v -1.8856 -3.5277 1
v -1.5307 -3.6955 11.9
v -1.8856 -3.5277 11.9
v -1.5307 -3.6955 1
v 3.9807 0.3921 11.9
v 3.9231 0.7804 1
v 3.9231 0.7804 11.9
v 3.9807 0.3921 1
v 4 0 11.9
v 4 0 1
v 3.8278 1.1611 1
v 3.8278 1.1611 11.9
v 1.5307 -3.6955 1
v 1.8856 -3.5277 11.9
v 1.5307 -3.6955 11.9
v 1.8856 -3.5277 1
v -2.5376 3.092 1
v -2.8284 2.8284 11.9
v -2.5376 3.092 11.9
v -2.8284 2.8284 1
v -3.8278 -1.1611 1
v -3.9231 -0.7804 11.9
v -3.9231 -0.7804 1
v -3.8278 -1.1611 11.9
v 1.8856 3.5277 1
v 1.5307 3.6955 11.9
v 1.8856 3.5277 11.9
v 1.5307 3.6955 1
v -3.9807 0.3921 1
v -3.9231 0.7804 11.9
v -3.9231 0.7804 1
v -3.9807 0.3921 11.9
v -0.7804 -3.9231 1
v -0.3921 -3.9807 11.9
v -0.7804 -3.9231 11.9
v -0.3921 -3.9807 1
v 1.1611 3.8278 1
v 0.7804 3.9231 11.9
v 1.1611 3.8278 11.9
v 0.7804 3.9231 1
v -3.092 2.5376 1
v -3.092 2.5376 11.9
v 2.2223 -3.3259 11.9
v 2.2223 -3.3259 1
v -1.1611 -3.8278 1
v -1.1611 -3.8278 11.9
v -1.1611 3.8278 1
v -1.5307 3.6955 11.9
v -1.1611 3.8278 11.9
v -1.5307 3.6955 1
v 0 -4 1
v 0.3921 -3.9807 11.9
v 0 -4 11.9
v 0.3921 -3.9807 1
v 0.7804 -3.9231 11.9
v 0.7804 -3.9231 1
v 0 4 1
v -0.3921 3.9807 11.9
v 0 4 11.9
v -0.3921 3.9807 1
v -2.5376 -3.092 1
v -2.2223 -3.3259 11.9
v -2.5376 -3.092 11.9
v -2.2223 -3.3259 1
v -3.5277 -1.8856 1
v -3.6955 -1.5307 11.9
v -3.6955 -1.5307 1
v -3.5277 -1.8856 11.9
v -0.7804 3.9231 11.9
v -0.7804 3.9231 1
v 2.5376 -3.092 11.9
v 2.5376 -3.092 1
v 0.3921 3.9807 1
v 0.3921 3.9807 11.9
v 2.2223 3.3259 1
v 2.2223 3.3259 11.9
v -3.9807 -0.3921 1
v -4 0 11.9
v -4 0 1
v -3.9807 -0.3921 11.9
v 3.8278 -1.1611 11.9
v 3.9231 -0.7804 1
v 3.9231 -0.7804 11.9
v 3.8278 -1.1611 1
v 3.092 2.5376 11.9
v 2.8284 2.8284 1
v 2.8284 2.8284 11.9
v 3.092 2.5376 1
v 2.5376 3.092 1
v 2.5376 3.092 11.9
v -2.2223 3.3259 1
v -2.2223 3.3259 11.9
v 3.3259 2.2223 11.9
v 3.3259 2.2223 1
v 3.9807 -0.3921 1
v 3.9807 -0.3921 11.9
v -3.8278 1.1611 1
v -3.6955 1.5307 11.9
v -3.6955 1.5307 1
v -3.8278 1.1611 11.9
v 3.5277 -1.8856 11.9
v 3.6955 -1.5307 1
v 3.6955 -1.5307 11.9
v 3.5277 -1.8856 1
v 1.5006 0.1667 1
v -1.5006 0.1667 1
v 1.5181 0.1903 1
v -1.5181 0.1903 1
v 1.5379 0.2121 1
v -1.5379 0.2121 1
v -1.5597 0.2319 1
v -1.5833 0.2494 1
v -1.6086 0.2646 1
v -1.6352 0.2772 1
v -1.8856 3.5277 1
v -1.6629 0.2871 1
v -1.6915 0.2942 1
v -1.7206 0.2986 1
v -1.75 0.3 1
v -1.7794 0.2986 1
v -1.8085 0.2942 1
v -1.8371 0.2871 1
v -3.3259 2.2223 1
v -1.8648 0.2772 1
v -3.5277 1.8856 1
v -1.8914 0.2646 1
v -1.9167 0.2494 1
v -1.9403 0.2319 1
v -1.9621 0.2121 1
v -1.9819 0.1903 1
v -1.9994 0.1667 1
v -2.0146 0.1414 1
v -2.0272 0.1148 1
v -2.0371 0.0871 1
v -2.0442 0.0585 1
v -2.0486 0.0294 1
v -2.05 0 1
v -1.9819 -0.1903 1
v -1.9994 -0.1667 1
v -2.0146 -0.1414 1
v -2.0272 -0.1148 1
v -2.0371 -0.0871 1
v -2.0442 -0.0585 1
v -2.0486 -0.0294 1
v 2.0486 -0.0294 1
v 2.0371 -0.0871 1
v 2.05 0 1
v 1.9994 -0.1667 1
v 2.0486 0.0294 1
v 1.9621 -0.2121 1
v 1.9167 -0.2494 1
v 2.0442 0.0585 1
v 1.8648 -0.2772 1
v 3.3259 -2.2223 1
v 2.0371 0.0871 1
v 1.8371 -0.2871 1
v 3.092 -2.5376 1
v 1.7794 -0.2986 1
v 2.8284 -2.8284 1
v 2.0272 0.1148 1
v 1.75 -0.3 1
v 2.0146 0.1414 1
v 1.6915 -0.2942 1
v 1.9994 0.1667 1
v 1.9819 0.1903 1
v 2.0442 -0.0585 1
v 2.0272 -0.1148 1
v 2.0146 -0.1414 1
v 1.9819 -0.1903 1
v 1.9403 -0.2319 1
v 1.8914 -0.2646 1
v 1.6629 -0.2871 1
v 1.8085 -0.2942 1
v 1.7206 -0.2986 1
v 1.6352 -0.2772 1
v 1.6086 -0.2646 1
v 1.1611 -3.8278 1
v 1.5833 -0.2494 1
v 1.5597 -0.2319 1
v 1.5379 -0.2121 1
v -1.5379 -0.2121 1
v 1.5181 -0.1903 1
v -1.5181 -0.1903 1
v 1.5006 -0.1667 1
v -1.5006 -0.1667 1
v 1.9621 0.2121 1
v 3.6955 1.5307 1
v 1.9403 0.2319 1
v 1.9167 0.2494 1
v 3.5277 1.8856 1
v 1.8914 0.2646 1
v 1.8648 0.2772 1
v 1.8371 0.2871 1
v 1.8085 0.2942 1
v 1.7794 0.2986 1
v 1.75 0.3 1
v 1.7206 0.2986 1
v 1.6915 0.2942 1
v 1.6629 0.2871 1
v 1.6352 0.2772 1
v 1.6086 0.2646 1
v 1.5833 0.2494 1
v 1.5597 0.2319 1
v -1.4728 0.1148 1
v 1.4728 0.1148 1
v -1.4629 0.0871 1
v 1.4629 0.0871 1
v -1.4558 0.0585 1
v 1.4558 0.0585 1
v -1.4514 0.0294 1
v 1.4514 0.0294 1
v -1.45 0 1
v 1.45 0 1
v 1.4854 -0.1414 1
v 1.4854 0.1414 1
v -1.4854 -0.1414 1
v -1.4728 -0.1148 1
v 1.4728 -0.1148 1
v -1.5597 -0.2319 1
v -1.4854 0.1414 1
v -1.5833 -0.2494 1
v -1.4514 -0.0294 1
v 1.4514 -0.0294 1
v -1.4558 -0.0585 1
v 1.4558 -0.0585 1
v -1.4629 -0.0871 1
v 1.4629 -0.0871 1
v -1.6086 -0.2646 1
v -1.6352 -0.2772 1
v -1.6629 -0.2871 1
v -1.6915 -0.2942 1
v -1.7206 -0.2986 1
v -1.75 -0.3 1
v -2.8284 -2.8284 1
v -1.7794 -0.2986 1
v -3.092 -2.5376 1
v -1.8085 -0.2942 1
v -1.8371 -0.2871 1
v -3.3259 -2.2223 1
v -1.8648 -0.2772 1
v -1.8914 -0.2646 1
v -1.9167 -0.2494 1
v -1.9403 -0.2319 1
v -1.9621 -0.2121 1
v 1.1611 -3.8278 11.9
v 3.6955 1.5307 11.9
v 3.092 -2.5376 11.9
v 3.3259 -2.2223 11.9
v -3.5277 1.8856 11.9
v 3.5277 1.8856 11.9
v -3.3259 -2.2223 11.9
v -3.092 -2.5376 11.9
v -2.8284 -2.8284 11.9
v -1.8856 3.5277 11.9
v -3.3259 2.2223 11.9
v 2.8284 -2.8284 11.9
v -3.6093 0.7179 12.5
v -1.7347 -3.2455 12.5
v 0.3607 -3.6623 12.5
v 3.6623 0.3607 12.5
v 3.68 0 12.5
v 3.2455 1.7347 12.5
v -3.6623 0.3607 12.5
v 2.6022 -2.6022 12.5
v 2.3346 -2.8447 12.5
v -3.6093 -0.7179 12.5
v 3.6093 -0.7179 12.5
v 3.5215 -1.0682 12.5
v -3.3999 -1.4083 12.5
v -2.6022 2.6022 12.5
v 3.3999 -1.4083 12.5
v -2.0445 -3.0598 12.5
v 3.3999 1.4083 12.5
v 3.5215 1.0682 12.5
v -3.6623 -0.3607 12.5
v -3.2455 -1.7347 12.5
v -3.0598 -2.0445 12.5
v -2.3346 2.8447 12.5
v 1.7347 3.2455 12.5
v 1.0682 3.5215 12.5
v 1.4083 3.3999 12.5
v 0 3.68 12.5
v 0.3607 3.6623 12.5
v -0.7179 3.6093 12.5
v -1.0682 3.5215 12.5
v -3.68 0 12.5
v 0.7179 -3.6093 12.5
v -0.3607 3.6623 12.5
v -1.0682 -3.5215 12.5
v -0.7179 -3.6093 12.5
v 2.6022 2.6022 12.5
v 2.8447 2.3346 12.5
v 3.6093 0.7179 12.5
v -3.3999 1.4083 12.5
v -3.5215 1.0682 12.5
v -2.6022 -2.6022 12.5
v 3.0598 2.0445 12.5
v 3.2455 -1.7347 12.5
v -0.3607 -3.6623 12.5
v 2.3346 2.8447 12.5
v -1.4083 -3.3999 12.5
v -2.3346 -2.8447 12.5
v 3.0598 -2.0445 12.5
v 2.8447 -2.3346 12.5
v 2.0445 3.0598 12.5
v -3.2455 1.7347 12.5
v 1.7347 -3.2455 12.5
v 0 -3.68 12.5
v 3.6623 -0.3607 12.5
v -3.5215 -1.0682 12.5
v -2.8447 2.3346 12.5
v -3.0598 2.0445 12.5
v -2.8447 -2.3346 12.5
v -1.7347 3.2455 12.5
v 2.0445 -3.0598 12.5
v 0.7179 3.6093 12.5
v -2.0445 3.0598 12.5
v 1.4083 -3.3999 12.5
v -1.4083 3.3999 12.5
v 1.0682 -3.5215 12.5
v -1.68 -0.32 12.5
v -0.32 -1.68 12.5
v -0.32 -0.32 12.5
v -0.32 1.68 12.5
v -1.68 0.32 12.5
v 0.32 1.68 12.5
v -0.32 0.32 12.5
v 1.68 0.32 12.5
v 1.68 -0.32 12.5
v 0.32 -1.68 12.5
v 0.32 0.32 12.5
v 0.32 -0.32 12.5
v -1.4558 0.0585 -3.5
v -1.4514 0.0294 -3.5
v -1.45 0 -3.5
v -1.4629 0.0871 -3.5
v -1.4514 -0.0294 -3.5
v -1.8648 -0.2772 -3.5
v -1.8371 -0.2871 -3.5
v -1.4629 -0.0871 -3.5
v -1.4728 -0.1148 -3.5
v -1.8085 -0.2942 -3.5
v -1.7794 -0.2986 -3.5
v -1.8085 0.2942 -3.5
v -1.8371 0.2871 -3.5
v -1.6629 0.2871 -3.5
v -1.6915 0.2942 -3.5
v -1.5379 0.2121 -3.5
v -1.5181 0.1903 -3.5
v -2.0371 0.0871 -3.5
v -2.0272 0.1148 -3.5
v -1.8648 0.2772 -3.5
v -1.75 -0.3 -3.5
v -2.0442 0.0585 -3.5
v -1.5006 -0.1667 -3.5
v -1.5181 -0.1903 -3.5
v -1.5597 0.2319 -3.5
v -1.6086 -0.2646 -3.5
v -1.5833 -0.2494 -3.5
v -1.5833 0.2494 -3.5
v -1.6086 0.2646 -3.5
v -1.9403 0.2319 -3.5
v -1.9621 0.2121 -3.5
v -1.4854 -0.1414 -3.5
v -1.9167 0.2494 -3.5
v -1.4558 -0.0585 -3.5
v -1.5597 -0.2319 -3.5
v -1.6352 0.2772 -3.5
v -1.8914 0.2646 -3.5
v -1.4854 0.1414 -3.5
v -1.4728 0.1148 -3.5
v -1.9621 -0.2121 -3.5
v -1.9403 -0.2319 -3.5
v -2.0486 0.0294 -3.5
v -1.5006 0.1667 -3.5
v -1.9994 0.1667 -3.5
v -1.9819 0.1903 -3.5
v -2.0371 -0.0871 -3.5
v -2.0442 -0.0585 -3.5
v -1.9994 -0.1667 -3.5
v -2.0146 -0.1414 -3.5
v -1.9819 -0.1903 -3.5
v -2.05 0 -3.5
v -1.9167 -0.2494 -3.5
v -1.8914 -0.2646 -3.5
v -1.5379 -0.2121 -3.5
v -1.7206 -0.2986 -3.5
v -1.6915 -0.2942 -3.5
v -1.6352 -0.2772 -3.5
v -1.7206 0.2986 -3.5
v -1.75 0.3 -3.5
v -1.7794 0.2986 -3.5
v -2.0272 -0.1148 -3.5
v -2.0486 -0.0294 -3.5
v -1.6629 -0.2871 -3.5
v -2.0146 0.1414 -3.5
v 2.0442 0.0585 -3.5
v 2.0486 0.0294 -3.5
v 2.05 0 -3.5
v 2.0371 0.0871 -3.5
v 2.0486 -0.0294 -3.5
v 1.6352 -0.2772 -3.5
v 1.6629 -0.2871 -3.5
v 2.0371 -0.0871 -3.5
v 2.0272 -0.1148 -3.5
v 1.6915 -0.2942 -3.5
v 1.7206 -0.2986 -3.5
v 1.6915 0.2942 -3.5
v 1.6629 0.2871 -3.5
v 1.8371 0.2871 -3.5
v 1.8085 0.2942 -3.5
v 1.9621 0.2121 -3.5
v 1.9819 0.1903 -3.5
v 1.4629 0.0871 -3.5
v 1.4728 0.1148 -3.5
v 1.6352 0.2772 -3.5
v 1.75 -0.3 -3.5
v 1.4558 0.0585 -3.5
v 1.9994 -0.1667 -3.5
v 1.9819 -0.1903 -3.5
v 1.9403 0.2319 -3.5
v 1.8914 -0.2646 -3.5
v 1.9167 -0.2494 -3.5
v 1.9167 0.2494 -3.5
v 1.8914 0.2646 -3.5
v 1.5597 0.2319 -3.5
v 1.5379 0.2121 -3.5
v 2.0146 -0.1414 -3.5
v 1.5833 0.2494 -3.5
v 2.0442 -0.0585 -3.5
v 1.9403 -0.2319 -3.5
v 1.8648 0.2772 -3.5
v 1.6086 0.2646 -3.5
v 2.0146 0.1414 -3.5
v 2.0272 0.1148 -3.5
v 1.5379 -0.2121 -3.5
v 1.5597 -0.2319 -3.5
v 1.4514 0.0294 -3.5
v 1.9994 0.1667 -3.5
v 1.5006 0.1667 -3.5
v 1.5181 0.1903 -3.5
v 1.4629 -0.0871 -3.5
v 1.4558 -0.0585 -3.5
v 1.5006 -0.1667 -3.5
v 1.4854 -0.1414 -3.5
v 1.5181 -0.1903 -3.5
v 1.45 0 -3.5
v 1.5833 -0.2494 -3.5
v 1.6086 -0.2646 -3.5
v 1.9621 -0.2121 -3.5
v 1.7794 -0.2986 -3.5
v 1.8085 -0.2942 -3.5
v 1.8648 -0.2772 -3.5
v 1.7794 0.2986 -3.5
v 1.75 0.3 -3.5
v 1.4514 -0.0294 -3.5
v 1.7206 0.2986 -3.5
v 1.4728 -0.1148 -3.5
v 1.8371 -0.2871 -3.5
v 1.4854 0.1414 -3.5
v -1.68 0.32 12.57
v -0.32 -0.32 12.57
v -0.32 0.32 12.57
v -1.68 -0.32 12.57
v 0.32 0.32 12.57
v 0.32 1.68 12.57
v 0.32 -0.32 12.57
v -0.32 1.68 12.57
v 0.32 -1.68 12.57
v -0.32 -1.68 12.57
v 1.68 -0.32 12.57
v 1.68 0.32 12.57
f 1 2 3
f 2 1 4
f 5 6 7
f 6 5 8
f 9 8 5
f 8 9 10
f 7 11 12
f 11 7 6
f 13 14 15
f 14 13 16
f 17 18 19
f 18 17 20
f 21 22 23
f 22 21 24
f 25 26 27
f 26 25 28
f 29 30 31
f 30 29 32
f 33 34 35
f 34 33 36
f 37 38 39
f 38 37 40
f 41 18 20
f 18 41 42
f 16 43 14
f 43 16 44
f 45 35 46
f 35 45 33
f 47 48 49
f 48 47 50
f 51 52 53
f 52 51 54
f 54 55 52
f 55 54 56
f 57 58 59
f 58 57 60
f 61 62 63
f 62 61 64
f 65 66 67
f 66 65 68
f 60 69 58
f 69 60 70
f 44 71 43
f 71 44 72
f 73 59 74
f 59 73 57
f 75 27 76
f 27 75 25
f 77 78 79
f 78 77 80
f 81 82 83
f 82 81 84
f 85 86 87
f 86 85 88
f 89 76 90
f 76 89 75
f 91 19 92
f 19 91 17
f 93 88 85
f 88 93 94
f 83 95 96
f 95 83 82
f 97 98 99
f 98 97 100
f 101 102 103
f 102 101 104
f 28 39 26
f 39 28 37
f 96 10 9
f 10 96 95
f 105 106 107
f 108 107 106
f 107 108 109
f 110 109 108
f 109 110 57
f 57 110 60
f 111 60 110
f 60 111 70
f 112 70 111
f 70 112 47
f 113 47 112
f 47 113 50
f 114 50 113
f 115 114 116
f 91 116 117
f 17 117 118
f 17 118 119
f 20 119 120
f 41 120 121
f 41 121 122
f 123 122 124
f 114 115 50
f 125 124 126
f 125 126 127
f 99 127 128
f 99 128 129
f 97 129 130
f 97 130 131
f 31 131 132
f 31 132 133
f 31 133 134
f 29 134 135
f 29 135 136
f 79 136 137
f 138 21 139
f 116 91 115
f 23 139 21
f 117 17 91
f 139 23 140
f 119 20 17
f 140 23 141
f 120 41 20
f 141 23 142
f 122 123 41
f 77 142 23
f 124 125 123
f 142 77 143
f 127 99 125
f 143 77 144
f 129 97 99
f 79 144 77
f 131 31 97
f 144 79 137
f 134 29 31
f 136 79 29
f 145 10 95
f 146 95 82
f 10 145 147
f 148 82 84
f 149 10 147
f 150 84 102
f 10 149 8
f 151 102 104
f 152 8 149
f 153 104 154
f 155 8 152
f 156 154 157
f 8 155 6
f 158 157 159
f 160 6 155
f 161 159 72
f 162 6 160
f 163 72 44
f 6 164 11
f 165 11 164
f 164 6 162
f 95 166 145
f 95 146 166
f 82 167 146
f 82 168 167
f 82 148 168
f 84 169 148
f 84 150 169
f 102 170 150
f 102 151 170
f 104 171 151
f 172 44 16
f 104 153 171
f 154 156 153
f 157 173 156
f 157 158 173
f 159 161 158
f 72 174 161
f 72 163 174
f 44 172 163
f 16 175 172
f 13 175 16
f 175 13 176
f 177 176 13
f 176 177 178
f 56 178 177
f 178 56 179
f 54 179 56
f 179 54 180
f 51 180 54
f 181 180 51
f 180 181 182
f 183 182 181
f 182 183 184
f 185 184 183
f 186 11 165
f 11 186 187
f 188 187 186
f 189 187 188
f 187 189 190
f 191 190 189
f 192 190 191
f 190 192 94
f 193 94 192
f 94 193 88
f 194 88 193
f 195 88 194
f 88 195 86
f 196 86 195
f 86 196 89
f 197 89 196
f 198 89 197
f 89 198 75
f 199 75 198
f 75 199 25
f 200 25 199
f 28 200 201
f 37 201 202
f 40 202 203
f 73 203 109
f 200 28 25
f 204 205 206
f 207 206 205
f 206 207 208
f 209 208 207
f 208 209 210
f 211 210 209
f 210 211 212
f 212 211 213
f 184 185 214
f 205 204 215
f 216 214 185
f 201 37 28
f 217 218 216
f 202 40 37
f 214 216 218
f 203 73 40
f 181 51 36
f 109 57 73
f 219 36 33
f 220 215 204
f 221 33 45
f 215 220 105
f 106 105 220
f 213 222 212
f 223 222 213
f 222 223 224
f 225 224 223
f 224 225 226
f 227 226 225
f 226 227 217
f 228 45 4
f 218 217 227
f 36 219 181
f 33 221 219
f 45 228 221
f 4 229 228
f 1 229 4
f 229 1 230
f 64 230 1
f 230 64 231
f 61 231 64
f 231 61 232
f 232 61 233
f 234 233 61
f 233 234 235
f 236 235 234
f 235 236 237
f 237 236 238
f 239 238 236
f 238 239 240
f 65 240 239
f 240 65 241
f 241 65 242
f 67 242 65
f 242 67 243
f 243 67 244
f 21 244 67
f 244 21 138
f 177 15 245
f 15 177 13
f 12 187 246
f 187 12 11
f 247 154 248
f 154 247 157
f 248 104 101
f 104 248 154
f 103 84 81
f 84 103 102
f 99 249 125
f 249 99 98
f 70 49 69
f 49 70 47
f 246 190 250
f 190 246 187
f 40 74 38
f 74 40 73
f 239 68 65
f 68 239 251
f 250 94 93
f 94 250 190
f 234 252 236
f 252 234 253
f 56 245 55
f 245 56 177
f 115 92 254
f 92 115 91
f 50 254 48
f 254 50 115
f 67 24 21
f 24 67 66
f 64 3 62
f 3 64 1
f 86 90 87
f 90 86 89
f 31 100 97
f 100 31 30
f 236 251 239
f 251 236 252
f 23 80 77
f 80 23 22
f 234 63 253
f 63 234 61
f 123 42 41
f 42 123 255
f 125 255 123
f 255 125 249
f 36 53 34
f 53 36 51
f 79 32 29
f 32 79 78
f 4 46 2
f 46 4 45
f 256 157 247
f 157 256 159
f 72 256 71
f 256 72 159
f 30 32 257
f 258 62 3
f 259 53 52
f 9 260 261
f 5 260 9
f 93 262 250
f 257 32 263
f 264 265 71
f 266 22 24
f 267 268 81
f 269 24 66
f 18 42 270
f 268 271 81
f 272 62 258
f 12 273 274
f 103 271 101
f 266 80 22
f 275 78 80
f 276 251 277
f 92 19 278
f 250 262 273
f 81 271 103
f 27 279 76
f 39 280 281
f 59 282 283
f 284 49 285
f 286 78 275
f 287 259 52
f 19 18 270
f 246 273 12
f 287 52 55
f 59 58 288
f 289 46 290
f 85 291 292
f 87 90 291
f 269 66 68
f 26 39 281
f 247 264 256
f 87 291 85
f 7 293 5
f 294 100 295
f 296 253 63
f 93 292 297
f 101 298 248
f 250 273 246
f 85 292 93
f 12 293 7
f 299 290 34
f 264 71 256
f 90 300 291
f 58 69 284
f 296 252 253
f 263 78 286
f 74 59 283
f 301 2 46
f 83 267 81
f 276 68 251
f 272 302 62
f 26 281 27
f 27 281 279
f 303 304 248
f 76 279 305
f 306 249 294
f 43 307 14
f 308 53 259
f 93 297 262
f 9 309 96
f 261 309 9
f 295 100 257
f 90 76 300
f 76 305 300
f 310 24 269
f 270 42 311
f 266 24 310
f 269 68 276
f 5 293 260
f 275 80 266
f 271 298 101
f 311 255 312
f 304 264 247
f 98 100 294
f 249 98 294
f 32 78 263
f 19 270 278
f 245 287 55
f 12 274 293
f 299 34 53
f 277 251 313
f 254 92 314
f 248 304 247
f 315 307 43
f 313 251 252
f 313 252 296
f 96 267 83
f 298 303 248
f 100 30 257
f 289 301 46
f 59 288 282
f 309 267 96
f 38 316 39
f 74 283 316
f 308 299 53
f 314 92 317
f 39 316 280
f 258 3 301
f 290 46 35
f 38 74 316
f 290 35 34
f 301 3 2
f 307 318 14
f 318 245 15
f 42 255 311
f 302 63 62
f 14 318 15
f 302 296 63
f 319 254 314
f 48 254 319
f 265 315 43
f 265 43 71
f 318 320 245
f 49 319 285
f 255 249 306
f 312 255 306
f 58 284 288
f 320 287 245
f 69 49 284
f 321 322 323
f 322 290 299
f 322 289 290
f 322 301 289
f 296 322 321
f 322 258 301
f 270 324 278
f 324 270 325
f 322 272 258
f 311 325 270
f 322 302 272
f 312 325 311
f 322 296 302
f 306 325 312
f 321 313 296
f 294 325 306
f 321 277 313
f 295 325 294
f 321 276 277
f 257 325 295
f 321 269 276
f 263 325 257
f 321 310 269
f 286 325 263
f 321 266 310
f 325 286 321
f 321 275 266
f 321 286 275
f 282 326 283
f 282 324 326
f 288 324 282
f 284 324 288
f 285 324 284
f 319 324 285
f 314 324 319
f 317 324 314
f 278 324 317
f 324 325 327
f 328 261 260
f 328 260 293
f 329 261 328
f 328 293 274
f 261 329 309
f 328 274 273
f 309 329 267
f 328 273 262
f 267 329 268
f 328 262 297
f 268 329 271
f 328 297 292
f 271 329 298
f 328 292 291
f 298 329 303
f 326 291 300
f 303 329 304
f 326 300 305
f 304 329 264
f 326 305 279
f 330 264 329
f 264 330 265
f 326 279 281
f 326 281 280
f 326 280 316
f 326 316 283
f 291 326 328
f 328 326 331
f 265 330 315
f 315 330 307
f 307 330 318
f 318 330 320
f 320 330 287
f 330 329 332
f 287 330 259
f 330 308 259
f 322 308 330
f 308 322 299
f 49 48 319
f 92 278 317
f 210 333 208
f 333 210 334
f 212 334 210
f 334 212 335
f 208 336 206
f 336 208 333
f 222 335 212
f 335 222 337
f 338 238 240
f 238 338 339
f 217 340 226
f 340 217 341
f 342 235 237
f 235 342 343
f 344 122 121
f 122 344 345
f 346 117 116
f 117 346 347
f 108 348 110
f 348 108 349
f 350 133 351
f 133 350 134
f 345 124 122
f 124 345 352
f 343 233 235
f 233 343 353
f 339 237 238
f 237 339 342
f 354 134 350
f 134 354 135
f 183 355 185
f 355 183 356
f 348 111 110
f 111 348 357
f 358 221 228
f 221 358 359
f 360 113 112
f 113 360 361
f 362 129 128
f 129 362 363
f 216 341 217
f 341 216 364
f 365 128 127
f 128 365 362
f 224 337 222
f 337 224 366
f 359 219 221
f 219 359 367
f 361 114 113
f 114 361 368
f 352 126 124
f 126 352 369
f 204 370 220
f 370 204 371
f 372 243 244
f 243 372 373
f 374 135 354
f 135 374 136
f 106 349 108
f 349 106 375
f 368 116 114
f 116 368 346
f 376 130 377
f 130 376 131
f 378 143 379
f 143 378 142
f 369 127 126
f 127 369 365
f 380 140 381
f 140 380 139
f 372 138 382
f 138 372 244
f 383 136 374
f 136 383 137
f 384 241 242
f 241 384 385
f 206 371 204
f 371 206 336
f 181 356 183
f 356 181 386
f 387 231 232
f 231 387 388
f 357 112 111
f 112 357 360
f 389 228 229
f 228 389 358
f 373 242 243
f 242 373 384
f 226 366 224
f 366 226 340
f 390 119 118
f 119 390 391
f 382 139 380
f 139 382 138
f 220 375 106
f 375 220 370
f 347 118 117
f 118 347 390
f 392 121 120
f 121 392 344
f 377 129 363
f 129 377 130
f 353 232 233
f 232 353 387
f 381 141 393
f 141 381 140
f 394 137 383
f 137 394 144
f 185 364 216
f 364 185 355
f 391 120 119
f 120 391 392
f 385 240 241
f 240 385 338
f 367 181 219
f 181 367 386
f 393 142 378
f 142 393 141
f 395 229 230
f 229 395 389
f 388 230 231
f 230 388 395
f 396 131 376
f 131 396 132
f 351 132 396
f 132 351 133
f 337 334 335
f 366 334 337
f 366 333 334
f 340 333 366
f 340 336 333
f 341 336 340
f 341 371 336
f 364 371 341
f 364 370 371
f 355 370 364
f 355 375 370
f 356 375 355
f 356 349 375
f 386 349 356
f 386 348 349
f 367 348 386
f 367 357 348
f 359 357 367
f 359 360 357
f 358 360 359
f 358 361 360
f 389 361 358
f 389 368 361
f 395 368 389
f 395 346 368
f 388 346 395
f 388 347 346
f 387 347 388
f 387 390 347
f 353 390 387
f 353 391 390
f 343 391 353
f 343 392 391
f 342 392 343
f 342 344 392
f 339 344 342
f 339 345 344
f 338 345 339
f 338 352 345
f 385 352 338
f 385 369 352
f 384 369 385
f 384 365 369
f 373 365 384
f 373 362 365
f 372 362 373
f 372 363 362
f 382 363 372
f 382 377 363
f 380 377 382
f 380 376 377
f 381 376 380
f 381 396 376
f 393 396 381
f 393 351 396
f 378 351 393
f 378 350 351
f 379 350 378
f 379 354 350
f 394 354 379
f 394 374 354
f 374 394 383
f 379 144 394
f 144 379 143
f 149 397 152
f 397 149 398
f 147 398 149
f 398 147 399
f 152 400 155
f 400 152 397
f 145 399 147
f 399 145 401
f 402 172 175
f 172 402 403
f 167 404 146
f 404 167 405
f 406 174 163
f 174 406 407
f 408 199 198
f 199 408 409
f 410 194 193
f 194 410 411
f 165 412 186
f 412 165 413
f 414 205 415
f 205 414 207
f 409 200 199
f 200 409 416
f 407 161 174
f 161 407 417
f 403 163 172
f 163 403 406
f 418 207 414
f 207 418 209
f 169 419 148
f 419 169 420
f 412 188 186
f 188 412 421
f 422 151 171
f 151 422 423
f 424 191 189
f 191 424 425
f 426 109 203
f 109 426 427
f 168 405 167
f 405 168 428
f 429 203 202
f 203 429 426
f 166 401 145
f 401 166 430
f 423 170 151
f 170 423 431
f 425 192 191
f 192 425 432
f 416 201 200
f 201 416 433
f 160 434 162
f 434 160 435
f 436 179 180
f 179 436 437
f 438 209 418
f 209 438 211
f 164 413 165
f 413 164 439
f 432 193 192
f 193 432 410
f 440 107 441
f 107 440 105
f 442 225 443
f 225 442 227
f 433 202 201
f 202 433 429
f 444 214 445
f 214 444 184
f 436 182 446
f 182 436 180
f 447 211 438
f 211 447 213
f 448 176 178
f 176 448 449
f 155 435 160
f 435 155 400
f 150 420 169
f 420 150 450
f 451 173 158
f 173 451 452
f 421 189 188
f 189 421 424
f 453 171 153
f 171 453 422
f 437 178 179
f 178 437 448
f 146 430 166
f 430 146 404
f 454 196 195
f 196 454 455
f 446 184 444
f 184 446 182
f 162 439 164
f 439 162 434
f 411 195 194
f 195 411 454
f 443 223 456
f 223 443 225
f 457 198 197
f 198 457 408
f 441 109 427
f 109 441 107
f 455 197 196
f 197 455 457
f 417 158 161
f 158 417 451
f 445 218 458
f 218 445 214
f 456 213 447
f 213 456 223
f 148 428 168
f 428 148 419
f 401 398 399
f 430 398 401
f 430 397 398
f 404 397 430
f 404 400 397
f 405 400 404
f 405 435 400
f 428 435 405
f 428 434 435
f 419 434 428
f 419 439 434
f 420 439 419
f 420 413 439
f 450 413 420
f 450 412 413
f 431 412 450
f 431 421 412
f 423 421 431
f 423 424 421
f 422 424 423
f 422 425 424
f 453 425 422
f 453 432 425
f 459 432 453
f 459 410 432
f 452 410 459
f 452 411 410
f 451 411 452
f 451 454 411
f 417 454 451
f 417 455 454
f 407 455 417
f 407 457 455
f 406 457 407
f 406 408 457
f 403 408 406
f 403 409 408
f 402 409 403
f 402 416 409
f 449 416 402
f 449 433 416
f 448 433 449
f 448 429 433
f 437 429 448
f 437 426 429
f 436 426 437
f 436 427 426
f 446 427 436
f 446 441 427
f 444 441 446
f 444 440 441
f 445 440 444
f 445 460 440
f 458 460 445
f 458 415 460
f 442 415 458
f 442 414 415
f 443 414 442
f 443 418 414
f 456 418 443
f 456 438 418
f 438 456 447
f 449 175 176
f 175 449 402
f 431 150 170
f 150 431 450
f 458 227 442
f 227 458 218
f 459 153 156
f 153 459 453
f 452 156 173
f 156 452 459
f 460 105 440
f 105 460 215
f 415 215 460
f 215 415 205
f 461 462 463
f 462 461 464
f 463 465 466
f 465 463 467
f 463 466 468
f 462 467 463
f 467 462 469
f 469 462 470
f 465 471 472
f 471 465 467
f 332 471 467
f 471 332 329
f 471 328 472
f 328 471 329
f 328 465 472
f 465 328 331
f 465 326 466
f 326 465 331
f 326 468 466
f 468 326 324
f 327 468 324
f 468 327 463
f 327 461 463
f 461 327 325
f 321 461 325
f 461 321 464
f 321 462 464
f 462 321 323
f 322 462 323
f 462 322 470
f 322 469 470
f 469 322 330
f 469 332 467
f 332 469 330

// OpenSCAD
$fn = 64;

body_diameter = 8;
body_height = 11.5;
lead_spacing = 3.5;
lead_diameter = 0.6;
lead_length_below = 3.5;
body_lift = 1;
lead_stub = 1;
top_chamfer = 0.6;

module lead(x) {
    color([0.75, 0.75, 0.75])
    translate([x, 0, -lead_length_below])
        cylinder(h = lead_length_below + body_lift + lead_stub, d = lead_diameter);
}

module capacitor_body() {
    color([0.16, 0.18, 0.19])
    union() {
        translate([0, 0, body_lift])
            cylinder(h = body_height - top_chamfer, d = body_diameter);
        translate([0, 0, body_lift + body_height - top_chamfer])
            cylinder(h = top_chamfer, d1 = body_diameter, d2 = body_diameter * 0.92);
    }
}

module top_vent() {
    color([0.78, 0.78, 0.78])
    translate([0, 0, body_lift + body_height - 0.05])
    linear_extrude(height = 0.12)
    union() {
        square([body_diameter * 0.42, body_diameter * 0.08], center = true);
        square([body_diameter * 0.08, body_diameter * 0.42], center = true);
    }
}

lead(-lead_spacing / 2);
lead( lead_spacing / 2);
capacitor_body();
top_vent();
